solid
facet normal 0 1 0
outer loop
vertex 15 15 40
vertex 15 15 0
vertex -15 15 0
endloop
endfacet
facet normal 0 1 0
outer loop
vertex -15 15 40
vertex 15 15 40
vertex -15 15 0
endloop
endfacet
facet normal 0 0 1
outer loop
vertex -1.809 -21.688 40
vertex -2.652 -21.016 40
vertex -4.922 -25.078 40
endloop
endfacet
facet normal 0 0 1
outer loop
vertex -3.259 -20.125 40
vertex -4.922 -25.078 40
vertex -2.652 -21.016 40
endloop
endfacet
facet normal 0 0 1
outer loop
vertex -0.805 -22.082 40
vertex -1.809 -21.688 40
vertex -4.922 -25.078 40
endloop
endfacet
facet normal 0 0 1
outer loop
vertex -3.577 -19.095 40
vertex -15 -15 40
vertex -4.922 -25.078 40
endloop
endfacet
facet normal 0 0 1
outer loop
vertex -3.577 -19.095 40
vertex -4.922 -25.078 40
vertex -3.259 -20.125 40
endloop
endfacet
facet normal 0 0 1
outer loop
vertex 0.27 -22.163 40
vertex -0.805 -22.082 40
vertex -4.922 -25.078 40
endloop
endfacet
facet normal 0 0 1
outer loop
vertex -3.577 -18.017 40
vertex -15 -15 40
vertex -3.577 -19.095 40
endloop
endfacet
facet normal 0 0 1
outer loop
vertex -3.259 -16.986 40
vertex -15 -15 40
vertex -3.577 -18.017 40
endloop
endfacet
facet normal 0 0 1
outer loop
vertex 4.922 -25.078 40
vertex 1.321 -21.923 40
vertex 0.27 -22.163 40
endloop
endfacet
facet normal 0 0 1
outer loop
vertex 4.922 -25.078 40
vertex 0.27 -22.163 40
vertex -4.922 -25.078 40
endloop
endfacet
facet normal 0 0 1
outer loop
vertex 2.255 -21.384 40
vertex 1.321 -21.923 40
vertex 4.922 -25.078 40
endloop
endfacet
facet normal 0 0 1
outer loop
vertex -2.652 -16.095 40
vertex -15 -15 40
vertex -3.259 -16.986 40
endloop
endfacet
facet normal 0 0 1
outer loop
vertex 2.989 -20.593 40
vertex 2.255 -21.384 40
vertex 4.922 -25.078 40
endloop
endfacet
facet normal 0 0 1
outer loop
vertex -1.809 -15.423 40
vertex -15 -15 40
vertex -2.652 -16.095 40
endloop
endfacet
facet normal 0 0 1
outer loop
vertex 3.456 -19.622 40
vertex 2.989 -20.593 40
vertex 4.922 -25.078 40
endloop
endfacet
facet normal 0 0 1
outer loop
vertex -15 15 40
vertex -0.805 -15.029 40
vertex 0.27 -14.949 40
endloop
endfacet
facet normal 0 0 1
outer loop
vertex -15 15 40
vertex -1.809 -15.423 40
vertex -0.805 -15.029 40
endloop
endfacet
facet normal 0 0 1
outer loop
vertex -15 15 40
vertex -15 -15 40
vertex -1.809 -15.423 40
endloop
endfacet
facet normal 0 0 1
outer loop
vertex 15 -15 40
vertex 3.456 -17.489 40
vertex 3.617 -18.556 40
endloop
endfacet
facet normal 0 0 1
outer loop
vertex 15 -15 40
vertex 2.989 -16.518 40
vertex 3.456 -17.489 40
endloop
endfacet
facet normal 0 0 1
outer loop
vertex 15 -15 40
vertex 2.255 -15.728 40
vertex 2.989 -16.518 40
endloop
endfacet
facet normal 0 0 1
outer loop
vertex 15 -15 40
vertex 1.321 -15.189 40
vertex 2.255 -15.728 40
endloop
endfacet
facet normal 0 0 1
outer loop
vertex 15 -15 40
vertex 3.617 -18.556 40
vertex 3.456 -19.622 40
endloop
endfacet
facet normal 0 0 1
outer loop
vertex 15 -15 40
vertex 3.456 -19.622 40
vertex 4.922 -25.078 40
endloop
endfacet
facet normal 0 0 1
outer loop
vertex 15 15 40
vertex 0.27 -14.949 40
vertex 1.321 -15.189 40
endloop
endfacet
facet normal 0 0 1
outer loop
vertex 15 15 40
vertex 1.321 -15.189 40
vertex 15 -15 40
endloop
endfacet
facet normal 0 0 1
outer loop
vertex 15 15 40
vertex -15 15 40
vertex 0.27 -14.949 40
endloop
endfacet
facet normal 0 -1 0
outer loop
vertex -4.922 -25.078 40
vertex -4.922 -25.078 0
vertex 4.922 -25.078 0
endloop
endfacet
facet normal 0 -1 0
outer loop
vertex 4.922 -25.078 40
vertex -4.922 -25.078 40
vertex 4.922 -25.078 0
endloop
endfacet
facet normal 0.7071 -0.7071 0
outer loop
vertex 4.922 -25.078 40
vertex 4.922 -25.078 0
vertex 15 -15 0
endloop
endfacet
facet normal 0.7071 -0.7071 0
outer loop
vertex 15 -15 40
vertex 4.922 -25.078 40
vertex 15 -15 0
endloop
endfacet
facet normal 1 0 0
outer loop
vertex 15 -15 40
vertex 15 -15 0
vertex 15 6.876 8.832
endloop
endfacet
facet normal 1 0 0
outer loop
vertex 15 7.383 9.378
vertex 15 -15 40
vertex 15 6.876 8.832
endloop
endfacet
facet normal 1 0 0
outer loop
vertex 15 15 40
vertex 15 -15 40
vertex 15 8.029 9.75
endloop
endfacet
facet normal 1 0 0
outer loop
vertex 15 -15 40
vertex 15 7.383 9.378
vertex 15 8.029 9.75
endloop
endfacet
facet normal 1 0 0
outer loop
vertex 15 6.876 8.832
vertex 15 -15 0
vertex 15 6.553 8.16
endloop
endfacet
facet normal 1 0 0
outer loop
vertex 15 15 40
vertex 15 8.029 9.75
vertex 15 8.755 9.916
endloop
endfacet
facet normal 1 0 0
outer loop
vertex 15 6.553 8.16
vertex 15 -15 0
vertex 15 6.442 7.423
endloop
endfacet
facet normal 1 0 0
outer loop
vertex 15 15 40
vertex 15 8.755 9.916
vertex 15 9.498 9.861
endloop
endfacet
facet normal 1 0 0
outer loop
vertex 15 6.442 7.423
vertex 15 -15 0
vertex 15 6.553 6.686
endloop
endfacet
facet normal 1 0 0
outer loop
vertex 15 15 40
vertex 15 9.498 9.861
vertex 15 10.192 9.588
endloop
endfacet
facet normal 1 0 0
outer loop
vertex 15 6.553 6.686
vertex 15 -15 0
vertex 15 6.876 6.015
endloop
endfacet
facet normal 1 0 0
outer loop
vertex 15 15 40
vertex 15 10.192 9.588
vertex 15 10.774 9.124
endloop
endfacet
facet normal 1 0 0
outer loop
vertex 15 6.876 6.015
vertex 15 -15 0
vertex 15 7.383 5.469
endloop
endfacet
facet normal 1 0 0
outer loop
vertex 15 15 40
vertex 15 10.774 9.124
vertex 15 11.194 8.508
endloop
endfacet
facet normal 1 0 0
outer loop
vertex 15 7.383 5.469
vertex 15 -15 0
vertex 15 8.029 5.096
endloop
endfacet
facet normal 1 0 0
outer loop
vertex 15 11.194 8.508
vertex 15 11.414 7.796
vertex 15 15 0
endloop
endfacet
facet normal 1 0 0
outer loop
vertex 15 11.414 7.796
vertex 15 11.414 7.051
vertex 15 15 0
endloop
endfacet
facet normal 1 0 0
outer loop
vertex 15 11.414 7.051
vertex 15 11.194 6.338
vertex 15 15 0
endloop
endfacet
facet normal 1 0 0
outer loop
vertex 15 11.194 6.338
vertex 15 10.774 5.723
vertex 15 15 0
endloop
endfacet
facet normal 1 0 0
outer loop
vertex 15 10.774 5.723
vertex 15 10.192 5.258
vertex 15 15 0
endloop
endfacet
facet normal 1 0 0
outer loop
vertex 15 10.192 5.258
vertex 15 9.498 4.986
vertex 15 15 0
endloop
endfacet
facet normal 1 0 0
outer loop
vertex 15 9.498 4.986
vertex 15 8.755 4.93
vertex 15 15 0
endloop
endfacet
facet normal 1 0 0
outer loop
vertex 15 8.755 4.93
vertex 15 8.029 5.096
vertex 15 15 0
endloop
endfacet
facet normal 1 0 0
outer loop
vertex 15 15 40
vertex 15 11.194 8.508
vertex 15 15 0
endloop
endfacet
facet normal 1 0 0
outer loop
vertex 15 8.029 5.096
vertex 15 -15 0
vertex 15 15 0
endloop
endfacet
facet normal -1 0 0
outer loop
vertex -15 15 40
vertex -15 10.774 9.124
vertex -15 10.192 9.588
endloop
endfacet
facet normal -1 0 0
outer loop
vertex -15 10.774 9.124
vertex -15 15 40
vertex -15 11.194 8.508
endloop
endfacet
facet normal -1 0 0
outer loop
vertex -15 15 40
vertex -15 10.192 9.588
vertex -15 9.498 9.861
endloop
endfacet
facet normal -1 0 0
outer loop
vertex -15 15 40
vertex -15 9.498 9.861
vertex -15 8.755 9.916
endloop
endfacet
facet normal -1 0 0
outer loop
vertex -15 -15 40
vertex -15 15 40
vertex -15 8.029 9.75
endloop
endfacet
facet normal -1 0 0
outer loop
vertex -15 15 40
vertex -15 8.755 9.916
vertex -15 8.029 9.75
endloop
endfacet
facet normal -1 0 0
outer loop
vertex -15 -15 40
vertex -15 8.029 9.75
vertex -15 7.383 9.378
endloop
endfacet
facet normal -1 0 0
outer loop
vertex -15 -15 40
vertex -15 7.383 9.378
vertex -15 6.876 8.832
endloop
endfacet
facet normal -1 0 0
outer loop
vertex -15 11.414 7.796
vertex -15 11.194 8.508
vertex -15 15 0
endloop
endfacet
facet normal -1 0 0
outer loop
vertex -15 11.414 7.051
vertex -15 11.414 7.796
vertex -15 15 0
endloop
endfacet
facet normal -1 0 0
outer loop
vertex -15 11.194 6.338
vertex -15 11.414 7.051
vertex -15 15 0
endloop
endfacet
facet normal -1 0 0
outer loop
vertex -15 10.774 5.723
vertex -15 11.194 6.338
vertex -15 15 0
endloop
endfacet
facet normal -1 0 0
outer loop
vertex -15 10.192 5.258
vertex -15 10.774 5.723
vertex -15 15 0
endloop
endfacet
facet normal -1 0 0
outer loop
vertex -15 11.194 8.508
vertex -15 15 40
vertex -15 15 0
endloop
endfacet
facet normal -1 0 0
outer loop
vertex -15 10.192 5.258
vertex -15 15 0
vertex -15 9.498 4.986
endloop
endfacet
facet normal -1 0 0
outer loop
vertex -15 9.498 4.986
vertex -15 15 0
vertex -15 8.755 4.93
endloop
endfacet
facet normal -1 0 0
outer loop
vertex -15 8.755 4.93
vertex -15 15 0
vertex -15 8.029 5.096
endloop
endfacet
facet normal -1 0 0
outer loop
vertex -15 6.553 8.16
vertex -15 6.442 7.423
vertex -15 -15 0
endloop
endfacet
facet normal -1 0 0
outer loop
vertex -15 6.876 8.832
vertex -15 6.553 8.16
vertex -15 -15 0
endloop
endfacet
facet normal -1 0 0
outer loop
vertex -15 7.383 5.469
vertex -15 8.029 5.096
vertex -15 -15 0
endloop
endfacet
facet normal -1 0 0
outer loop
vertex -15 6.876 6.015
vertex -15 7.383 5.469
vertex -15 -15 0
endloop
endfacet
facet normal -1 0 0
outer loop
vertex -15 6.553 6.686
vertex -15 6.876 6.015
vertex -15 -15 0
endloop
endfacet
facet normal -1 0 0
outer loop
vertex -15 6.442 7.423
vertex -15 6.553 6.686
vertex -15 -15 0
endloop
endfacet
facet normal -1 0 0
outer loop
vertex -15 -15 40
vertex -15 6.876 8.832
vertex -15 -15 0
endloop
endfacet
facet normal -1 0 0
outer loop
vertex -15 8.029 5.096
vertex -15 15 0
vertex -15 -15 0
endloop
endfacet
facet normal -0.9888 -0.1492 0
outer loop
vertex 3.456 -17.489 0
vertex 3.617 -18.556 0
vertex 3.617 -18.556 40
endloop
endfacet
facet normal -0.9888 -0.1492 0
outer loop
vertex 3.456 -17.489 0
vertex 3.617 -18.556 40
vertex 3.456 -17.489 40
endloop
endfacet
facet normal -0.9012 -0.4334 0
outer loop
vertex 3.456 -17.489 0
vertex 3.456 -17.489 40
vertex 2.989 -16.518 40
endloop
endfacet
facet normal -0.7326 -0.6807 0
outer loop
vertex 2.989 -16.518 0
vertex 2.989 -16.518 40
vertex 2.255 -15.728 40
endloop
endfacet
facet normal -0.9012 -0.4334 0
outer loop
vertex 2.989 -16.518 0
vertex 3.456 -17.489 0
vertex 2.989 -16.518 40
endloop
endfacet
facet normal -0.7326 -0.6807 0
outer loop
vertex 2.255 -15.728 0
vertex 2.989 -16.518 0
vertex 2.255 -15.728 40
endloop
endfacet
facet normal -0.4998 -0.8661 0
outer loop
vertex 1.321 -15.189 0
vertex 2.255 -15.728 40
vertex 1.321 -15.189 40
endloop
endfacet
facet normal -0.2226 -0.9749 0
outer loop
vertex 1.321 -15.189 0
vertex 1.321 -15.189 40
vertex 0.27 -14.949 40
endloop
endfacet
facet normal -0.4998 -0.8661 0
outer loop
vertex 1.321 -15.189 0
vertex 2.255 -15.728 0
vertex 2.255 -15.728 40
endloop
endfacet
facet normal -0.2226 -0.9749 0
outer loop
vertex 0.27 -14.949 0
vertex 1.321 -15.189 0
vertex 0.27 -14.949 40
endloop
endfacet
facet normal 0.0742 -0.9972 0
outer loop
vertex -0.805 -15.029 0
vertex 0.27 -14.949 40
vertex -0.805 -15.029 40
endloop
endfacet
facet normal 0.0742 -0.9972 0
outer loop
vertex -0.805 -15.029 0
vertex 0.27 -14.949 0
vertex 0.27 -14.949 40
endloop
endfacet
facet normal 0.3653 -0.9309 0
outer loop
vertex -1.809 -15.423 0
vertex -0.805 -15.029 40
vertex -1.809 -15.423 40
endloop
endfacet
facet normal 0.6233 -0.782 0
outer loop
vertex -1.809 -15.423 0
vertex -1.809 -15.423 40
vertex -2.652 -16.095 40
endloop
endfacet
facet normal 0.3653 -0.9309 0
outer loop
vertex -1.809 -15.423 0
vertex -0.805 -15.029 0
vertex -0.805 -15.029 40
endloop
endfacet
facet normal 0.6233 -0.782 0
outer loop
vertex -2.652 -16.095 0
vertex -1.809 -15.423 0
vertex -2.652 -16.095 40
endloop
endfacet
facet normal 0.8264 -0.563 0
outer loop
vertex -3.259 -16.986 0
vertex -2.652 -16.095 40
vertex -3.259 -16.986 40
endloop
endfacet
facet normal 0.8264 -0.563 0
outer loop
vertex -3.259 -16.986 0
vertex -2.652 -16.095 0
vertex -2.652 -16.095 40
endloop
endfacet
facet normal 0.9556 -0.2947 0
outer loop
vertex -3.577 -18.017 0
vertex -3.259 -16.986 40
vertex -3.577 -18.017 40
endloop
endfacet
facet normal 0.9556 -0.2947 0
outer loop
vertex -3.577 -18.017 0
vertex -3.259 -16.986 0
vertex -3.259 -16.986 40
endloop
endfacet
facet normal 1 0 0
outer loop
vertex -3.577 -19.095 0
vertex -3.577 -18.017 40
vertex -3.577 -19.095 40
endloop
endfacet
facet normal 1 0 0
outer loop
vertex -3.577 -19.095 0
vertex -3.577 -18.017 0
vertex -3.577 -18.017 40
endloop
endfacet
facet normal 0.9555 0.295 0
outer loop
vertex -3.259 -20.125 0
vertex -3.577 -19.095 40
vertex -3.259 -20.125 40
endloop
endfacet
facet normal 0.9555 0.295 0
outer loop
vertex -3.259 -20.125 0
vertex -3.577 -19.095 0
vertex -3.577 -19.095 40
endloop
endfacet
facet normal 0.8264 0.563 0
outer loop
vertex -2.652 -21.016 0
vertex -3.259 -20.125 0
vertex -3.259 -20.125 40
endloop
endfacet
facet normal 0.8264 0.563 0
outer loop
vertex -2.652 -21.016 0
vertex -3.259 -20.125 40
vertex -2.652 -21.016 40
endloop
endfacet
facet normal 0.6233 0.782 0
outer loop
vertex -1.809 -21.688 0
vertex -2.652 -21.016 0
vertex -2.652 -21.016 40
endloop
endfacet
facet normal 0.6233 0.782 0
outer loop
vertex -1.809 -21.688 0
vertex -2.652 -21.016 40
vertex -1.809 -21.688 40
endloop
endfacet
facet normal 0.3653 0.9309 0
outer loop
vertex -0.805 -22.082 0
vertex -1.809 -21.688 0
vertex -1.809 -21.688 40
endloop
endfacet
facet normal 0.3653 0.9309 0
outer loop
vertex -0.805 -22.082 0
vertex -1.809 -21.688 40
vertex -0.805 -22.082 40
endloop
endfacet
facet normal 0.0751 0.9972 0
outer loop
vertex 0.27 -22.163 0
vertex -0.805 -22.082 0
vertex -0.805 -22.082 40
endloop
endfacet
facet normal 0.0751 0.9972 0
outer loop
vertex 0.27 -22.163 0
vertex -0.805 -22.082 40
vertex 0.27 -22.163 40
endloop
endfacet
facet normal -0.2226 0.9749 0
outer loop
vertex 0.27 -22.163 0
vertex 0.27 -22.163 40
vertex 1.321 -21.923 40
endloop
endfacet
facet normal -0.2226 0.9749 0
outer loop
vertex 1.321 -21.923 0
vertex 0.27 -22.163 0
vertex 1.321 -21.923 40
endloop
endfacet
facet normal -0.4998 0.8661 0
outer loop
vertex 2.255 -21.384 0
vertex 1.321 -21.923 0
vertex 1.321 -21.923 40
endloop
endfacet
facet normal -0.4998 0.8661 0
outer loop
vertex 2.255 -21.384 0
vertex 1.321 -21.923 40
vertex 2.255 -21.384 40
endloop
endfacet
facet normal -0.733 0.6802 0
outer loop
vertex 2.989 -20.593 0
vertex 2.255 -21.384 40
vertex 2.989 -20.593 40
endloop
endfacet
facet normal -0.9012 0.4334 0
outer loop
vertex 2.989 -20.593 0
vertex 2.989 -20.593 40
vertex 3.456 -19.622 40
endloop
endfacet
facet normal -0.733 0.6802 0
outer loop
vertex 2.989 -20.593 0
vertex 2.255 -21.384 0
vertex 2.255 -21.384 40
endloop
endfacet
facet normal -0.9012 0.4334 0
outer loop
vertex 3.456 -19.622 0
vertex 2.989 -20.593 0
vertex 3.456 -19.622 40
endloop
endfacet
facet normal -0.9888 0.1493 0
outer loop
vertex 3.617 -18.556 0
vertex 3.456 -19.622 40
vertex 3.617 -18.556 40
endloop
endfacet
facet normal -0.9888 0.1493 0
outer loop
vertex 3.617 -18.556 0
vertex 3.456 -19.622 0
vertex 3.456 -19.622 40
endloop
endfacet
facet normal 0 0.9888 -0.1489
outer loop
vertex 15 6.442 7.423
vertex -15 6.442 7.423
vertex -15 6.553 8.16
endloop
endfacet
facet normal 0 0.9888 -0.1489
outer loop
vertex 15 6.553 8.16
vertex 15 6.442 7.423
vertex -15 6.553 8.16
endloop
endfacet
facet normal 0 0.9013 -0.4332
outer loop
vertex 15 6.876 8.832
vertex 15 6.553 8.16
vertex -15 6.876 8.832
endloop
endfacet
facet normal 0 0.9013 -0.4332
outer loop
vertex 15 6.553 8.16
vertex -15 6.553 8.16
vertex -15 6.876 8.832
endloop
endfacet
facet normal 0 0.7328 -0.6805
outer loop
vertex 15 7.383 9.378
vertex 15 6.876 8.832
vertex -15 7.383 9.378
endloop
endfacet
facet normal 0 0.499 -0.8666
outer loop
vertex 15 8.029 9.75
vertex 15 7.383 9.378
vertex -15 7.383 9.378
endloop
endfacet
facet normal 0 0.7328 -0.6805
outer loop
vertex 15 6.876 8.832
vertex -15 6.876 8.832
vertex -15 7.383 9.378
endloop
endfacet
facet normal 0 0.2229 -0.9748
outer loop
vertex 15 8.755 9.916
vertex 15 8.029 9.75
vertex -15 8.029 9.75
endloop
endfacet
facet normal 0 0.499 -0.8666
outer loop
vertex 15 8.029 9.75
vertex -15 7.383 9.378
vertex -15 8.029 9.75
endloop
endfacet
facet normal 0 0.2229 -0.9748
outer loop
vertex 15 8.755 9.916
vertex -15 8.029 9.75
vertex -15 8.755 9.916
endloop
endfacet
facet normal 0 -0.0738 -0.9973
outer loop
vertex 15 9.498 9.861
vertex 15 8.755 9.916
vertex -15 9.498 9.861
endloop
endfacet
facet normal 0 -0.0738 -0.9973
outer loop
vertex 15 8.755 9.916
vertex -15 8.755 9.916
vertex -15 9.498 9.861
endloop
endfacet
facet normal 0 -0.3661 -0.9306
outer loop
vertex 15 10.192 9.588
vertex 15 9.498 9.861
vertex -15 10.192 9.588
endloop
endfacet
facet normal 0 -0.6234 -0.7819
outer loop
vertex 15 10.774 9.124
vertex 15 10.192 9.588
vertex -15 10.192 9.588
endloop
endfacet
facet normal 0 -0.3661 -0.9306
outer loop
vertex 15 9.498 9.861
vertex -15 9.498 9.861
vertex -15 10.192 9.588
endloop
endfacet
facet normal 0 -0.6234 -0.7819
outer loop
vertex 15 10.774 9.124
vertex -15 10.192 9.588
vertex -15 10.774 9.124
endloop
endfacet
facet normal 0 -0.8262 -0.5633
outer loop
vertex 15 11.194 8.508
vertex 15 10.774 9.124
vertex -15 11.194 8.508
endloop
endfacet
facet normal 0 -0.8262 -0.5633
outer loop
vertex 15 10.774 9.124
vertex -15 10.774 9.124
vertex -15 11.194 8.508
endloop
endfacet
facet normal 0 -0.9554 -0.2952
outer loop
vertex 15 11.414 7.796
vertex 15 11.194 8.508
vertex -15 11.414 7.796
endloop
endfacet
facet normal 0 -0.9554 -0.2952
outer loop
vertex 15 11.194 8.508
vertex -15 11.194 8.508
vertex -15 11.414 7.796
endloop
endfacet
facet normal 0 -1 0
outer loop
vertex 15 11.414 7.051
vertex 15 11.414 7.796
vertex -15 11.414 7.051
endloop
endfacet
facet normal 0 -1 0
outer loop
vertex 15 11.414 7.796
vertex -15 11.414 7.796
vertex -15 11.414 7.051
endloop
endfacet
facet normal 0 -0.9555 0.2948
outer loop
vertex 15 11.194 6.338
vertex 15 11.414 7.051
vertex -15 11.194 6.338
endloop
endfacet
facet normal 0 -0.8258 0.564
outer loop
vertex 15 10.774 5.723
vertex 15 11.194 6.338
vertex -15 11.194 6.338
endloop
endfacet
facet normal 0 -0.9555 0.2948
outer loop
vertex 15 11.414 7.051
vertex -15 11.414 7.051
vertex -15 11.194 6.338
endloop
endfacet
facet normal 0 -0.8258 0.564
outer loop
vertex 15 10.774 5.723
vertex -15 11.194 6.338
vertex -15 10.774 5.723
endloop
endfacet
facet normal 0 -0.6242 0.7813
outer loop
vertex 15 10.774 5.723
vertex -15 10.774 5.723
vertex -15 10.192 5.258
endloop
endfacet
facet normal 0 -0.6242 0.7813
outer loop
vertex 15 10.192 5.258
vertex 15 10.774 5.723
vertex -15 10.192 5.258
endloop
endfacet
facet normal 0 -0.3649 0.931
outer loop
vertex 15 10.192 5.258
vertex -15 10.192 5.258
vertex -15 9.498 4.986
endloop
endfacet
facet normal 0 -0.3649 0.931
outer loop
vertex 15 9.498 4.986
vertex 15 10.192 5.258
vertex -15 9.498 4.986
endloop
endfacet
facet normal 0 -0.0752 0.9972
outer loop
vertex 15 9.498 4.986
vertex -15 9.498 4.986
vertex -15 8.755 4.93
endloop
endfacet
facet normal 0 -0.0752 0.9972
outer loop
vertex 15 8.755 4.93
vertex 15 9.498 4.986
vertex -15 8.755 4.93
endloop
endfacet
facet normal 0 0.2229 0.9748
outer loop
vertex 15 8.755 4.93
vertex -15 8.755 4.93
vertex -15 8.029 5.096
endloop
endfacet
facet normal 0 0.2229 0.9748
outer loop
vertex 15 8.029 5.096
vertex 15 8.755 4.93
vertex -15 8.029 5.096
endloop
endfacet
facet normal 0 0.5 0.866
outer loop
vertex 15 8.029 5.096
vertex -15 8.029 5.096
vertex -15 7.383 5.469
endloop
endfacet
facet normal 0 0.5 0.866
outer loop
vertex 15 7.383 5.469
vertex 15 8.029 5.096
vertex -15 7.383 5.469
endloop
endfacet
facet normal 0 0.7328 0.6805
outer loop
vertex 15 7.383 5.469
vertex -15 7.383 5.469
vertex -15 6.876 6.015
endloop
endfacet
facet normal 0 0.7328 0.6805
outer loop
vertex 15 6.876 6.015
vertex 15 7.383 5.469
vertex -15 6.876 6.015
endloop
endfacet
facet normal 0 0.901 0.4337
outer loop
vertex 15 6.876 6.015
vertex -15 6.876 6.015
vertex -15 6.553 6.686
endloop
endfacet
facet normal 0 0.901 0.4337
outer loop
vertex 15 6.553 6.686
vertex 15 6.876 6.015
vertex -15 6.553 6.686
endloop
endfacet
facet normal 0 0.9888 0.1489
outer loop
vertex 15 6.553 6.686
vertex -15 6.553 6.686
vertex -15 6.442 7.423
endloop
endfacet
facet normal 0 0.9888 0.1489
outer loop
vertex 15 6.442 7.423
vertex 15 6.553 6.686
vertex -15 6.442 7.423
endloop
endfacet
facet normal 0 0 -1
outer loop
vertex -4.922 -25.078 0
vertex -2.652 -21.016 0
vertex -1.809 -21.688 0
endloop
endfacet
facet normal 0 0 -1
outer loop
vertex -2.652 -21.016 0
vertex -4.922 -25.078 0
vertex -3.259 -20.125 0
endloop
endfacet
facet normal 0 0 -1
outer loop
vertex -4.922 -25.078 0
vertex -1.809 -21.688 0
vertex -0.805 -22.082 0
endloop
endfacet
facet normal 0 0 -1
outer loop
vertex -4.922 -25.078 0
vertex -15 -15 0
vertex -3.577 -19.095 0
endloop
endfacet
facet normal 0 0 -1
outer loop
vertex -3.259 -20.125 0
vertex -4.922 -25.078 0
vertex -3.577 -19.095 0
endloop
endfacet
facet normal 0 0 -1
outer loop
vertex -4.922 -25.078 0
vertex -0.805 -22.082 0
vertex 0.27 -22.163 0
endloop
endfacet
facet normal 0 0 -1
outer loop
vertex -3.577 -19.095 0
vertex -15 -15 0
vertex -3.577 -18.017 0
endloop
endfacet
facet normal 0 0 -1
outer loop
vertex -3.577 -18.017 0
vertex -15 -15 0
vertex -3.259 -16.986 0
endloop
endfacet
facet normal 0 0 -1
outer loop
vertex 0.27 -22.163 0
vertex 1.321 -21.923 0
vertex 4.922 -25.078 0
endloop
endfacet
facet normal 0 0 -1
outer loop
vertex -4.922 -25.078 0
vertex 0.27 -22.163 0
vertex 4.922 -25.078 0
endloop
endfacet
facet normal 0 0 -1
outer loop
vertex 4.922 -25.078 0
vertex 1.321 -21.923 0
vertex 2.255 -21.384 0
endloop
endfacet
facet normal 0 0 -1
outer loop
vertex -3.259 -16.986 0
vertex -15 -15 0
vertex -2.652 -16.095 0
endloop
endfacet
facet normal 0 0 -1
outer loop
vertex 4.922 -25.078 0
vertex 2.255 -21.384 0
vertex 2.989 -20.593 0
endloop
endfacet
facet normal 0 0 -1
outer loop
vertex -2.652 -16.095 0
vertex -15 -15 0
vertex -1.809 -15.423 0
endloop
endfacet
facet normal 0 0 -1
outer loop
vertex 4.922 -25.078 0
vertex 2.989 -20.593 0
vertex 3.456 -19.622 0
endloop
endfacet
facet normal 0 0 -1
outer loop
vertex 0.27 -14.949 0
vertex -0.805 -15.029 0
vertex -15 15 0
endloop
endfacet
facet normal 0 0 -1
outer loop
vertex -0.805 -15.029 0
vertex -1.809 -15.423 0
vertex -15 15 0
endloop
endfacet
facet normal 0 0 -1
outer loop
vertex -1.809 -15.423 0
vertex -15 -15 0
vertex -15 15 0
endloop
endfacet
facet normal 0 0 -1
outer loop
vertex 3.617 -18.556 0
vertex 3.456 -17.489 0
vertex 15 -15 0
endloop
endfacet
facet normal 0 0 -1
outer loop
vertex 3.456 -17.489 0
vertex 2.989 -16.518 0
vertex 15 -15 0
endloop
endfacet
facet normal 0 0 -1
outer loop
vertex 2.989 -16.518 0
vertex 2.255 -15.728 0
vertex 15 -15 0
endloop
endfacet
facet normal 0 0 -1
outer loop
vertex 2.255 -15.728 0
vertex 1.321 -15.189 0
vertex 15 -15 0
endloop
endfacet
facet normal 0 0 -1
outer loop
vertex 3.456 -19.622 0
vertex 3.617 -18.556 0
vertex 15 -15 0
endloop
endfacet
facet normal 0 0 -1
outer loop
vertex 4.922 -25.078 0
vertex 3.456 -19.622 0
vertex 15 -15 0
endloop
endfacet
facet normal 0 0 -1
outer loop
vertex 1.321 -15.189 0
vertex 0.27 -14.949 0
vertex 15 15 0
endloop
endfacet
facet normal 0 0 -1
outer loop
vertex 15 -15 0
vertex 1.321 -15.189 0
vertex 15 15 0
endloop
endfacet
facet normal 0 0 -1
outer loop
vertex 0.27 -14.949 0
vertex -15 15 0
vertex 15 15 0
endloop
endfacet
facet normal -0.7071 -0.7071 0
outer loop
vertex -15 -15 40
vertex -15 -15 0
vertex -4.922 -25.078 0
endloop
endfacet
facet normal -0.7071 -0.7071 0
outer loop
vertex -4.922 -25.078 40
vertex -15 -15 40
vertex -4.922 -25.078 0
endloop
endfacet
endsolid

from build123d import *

# Parameters (mm, degrees)
SKETCH1_R             = 3.617136877
BOSS_EXTRUDE1_DEPTH   = 40
F_5_0MM_DOWEL_HOLE1_D = 5


with BuildPart() as part:
    # Sketch1 → Boss-Extrude1 (new body)
    with BuildSketch(Plane.XY):
        Polygon((-15, -15), (-4.922326912, -25.077673088), (4.922326912, -25.077673088), (15, -15), (15, 15), (-15, 15), align=None)
        with Locations((0, -18.555652187)):
            Circle(SKETCH1_R, mode=Mode.SUBTRACT)
    extrude(amount=BOSS_EXTRUDE1_DEPTH)

    # Ø5.0mm Dowel Hole1 (through all)
    with Locations(Plane(origin=(15, 8.941860577, 7.42320161), x_dir=(0, 1, 0), z_dir=(1, 0, 0))):
        with Locations((0, 0)):
            Hole(F_5_0MM_DOWEL_HOLE1_D / 2)


solid = part.part
